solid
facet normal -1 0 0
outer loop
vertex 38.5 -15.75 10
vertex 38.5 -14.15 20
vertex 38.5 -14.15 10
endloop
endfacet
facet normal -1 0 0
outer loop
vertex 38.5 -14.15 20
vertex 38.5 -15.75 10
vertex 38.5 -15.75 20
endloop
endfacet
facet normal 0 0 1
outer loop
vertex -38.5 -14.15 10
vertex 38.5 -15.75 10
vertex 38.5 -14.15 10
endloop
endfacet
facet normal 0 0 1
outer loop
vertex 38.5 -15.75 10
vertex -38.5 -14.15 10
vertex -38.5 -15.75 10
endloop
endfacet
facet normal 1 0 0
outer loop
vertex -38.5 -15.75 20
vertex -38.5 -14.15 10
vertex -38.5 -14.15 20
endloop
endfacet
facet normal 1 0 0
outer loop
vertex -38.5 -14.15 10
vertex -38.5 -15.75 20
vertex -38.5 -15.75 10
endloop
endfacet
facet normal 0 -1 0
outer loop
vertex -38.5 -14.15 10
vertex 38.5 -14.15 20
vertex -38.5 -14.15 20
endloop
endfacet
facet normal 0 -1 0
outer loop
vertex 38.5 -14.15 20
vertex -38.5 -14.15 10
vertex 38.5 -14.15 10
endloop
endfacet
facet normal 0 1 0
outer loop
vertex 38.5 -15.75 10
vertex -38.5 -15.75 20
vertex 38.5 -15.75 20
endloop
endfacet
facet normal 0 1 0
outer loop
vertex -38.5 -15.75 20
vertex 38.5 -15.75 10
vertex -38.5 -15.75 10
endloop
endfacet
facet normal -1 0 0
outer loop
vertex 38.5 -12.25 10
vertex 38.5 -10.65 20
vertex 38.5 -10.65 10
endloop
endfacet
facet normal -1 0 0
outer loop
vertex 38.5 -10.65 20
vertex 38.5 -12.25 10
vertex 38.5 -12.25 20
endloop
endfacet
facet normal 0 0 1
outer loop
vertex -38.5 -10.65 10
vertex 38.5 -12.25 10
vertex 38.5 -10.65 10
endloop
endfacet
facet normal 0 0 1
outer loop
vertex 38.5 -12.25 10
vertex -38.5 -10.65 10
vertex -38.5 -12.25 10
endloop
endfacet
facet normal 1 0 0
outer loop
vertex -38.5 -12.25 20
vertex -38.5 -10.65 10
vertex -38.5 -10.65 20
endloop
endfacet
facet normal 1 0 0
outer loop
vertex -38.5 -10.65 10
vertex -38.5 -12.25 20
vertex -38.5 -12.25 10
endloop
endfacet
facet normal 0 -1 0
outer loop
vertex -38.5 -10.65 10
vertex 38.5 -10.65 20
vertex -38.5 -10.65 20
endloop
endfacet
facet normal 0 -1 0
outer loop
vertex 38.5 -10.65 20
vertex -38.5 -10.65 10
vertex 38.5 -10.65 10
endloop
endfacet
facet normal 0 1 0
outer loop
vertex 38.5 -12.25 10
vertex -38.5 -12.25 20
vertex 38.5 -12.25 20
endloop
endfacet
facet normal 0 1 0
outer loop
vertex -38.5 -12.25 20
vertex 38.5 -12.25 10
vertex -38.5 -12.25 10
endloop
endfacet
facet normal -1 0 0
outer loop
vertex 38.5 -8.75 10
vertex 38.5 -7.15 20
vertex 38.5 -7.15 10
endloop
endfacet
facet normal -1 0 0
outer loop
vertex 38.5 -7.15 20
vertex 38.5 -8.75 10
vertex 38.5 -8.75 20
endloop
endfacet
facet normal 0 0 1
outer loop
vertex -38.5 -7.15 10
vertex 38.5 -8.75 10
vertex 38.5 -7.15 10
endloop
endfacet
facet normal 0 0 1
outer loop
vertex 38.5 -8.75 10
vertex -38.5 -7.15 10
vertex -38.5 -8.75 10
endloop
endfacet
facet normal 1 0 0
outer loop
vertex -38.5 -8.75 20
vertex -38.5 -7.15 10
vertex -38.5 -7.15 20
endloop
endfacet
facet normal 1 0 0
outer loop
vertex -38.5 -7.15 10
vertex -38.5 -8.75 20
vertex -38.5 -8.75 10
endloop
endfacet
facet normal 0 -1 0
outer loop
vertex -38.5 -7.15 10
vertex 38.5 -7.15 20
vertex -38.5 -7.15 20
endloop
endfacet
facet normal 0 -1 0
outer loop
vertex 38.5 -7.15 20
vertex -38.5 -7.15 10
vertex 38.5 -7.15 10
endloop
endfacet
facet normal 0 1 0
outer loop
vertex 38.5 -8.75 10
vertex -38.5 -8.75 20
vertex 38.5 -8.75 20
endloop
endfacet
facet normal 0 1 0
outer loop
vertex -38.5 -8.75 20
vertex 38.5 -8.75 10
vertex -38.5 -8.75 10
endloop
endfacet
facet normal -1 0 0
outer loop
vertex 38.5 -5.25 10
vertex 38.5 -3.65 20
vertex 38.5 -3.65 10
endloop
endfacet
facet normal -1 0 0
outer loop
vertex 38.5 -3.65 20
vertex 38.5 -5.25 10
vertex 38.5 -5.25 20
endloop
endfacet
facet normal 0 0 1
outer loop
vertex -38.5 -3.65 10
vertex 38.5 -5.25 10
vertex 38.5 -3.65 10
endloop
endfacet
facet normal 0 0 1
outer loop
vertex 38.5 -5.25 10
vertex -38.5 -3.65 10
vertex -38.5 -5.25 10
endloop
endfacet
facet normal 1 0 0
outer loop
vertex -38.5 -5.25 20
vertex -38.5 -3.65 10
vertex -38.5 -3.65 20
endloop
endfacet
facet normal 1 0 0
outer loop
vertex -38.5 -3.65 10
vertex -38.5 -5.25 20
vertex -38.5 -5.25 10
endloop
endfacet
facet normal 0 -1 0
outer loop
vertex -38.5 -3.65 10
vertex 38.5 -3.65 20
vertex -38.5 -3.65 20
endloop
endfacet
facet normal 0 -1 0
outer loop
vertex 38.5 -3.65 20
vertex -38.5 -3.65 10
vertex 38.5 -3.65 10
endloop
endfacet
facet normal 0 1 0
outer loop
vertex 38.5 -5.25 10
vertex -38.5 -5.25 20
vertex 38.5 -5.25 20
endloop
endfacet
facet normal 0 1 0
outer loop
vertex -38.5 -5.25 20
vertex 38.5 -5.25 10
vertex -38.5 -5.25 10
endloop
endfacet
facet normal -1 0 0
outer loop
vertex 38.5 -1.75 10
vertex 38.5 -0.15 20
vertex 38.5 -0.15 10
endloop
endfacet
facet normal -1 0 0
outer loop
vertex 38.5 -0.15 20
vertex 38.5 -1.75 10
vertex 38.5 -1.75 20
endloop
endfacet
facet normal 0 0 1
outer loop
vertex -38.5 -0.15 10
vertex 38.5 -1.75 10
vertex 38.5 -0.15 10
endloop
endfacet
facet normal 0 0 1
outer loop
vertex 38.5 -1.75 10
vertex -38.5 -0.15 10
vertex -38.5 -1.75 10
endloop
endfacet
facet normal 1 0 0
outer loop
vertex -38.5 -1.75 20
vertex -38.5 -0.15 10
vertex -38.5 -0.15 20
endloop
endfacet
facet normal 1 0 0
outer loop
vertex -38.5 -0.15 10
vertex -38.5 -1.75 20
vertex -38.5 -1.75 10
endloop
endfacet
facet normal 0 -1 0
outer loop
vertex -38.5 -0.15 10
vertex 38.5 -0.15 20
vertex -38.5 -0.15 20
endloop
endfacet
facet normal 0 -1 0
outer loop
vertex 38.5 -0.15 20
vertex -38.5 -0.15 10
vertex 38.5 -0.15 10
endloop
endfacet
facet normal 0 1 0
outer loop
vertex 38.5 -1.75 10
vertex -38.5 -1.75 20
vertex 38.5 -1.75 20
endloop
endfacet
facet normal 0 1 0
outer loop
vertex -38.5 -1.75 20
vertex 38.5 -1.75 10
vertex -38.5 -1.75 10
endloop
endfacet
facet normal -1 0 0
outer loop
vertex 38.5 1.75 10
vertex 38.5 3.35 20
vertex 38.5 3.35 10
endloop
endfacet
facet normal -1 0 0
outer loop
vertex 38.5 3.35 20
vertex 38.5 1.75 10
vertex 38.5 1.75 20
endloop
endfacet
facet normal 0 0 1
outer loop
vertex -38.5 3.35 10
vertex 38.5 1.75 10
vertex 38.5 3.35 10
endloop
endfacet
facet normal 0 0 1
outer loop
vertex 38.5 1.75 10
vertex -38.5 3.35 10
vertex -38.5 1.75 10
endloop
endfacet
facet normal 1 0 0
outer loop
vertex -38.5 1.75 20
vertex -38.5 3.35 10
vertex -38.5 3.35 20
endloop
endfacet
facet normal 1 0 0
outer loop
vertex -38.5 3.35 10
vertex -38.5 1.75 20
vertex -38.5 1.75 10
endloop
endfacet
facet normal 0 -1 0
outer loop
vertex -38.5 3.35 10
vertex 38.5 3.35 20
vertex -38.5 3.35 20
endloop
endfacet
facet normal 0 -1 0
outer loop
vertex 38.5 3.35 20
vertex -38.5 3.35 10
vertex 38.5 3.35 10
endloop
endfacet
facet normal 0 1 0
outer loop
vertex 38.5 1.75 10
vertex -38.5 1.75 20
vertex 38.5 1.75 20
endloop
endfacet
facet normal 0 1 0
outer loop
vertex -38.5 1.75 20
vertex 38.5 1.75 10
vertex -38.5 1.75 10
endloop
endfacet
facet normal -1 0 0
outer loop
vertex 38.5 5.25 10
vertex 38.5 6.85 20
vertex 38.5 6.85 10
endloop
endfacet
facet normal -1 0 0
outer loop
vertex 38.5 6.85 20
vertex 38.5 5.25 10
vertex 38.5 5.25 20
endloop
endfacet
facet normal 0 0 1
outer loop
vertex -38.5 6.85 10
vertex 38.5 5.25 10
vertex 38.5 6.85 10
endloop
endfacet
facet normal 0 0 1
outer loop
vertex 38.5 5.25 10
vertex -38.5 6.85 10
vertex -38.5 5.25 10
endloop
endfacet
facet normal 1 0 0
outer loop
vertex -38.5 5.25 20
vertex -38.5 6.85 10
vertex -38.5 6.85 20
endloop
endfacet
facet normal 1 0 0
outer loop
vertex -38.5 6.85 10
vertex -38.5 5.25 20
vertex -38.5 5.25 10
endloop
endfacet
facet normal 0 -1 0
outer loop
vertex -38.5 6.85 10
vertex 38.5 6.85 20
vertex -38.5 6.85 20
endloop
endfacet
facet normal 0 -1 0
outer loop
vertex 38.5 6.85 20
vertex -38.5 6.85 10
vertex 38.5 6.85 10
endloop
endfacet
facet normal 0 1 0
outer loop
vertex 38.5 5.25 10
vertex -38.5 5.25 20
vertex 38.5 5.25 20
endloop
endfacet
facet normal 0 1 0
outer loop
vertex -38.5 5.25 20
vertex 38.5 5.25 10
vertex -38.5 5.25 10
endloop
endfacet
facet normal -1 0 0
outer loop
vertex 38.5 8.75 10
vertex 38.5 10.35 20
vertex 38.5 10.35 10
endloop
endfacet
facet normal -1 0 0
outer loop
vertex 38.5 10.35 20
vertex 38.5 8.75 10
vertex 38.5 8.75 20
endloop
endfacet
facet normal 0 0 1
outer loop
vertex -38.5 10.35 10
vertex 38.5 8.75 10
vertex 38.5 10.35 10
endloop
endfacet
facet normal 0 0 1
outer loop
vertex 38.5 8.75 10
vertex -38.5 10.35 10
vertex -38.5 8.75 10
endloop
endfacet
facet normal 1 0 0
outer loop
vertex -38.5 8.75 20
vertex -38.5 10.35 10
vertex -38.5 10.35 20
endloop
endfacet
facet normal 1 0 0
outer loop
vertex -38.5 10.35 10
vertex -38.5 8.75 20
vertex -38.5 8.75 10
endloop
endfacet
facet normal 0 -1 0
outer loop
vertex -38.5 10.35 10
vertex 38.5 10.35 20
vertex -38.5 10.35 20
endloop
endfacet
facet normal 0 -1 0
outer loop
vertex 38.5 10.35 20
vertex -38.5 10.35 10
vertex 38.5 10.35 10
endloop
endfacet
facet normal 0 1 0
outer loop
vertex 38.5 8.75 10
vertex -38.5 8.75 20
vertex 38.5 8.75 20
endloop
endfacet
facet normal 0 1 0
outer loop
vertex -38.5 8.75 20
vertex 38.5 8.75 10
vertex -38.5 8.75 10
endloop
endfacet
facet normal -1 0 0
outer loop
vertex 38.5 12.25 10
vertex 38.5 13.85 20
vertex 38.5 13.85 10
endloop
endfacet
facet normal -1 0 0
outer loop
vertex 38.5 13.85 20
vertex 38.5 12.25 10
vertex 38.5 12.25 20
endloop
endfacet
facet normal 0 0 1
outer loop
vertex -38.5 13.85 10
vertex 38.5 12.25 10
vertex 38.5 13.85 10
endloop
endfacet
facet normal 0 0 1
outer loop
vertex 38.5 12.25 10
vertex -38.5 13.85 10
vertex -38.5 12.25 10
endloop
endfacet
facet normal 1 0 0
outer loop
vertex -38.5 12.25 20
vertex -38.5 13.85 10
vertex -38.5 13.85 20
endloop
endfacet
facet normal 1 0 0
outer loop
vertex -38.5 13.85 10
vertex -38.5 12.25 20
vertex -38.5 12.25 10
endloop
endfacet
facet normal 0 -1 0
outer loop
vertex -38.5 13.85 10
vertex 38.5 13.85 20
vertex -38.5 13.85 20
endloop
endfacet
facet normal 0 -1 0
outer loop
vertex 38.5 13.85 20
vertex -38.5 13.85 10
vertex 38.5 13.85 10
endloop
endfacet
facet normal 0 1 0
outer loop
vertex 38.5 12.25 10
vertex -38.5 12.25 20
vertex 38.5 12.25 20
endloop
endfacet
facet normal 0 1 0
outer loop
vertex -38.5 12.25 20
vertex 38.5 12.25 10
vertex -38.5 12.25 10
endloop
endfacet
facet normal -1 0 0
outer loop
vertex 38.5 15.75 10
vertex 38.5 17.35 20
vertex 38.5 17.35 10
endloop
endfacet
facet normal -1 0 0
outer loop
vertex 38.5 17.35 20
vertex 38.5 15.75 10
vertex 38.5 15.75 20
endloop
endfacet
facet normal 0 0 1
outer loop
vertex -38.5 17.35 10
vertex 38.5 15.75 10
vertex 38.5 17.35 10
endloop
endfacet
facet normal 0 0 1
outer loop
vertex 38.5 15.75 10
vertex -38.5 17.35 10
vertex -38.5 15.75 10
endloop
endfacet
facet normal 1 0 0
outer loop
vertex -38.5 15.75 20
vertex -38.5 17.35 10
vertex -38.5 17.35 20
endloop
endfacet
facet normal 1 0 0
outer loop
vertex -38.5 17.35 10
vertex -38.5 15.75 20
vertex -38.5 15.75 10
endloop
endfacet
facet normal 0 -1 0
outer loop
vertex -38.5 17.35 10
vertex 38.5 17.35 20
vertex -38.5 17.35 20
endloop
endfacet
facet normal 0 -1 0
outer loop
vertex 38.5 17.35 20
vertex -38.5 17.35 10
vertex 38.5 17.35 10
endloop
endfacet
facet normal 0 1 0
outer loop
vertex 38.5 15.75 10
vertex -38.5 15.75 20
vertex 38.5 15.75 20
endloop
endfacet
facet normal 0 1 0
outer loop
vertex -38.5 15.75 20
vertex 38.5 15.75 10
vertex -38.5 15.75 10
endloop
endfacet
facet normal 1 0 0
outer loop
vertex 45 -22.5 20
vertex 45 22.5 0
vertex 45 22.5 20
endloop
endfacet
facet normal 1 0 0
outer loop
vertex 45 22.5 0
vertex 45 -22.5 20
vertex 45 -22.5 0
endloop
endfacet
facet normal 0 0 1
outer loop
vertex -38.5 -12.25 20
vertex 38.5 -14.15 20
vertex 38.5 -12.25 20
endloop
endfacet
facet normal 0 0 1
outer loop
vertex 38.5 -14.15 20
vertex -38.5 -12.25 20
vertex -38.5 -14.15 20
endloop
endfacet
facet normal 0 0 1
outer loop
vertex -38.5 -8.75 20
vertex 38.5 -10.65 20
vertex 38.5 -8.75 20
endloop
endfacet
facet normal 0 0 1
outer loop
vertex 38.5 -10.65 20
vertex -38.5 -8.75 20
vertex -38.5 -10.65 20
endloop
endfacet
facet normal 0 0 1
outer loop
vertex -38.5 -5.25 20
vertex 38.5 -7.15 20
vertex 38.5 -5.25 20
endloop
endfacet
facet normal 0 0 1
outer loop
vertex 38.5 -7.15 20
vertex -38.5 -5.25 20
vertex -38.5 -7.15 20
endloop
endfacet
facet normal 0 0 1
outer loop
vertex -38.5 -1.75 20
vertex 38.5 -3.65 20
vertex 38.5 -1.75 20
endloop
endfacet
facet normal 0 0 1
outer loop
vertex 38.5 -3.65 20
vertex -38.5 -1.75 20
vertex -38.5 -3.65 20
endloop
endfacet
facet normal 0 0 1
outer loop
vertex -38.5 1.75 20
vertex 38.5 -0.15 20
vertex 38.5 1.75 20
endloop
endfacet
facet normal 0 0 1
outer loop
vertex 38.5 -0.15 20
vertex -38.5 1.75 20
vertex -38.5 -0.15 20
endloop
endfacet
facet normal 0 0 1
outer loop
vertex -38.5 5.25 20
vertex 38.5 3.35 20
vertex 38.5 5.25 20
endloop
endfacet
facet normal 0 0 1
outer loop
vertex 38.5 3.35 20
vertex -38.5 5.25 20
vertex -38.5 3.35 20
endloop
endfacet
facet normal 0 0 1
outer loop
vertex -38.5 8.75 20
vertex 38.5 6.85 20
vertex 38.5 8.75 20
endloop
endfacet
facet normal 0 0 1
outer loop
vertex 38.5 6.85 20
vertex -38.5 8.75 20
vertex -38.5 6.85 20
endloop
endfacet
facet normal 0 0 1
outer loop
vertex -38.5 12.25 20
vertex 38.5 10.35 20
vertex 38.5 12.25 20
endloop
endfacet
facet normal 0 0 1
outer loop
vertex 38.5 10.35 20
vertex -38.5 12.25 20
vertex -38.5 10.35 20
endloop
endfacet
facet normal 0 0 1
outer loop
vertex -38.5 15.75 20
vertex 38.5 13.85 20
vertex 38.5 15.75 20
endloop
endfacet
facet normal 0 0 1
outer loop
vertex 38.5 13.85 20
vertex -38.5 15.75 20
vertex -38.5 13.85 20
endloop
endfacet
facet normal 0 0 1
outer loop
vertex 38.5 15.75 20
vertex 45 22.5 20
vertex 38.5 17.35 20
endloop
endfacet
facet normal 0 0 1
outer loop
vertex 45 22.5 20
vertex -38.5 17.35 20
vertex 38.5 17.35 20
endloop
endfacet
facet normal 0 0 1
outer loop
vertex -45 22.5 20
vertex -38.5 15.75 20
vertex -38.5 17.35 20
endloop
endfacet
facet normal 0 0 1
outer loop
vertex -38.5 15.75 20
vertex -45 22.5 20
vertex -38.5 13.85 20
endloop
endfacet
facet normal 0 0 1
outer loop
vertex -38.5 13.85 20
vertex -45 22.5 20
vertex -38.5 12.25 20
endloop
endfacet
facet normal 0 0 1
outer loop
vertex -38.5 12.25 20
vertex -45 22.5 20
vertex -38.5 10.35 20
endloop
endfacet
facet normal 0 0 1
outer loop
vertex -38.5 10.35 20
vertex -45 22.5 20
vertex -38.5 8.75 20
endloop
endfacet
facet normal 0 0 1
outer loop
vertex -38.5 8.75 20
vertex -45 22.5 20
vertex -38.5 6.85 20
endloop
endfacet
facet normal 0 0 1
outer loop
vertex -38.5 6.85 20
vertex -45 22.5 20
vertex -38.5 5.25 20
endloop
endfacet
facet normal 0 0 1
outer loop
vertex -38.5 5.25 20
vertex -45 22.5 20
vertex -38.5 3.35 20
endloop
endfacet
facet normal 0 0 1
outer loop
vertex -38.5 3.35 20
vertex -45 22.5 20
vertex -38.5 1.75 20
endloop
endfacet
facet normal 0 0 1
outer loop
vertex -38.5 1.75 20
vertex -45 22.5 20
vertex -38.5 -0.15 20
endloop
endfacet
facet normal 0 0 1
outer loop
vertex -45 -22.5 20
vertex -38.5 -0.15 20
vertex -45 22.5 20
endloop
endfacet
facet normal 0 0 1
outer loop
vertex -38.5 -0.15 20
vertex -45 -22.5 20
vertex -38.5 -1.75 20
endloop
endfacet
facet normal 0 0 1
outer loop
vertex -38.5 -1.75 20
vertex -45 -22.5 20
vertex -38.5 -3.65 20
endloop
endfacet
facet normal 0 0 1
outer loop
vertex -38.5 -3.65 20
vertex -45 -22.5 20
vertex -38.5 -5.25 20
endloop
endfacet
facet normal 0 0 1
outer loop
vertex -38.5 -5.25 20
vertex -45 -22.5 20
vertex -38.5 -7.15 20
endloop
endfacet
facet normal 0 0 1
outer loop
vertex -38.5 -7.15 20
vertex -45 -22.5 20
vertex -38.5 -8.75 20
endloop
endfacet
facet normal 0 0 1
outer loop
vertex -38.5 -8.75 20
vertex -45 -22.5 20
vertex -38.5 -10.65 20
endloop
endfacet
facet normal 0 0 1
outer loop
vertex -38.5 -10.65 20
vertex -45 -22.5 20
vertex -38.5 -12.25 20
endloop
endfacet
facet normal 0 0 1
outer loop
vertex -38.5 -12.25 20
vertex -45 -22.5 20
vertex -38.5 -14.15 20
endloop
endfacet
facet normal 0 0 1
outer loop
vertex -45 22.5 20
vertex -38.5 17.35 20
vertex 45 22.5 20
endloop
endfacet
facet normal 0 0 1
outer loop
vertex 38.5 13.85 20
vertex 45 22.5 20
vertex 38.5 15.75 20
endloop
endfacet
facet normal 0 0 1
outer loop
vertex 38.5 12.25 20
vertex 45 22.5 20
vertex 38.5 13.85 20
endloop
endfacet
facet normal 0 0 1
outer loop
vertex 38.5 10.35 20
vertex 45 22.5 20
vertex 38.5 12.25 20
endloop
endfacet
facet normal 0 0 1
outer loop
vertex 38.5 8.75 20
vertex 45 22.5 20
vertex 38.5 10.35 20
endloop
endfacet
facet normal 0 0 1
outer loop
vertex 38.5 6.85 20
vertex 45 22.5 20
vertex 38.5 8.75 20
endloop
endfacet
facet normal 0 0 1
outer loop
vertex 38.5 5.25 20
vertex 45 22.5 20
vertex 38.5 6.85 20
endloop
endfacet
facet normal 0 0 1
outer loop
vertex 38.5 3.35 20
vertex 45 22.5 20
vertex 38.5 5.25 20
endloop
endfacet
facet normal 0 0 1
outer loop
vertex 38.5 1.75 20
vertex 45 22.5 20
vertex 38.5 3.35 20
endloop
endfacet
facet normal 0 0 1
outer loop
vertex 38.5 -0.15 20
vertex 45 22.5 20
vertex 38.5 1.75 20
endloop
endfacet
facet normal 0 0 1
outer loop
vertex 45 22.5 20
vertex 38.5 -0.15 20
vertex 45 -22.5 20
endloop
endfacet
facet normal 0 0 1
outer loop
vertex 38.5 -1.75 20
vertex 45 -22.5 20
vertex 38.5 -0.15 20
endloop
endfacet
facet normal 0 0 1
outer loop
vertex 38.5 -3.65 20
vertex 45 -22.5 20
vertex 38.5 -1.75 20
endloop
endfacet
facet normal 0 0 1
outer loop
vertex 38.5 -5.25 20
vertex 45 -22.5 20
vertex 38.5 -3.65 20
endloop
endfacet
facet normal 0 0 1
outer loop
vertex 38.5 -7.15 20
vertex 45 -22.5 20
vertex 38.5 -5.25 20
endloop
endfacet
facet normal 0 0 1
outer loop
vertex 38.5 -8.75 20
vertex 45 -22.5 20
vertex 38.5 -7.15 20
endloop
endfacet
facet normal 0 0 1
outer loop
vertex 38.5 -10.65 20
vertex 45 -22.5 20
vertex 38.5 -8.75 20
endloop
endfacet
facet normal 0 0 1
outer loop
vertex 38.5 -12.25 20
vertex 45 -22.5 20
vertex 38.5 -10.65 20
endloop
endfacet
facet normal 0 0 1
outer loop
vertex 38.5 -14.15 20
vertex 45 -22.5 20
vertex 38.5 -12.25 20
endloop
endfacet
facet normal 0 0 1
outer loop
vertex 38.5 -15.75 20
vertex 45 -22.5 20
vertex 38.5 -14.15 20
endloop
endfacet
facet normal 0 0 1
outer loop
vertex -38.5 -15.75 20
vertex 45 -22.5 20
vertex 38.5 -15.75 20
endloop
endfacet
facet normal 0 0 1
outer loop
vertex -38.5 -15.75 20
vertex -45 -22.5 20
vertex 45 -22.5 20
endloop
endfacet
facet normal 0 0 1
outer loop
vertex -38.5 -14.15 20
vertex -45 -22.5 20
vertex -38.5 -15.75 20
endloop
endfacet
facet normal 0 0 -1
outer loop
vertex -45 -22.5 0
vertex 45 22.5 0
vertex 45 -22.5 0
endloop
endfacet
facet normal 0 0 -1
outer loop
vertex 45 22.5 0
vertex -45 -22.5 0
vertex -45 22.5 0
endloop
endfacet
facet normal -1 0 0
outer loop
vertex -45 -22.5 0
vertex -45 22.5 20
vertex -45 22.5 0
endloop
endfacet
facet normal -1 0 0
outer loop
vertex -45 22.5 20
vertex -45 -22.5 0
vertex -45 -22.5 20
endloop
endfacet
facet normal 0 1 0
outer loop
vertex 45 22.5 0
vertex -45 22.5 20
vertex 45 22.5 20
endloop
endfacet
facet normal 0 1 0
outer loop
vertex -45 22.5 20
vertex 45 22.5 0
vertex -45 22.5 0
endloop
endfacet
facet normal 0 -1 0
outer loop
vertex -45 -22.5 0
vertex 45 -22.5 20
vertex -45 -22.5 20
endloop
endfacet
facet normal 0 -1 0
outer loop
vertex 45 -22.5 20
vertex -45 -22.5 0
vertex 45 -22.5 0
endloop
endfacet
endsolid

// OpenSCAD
// Slide drying rack - holds 10 microscope slides upright on their long edge
// Print orientation: base block on the bed (z = 0), slots open upward.

// ---------------- Parameters ----------------
block_len    = 90;    // base block length along X (mm)
block_wid    = 45;    // base block width along Y (mm)
block_h      = 20;    // base block height along Z (mm)

slot_len     = 77;    // slot length along X (mm)
slot_w       = 1.6;   // slot width along Y (mm)
slot_depth   = 10;    // slot depth from top face (mm)
slot_pitch   = 3.5;   // centre-to-centre spacing of slots in Y (mm)
slot_count   = 10;    // number of slide slots

eps          = 0.5;   // overshoot so cutters pass cleanly through the top face (mm)

$fn = 64;

// ---------------- Model ----------------
difference() {
    // Base block, centred in X and Y, sitting on z = 0
    translate([-block_len/2, -block_wid/2, 0])
        cube([block_len, block_wid, block_h]);

    // Row of parallel slots, centred on the block in X and Y
    for (i = [0 : slot_count - 1]) {
        y = (i - (slot_count - 1)/2) * slot_pitch;
        translate([-slot_len/2, y, block_h - slot_depth])
            cube([slot_len, slot_w, slot_depth + eps]);
    }
}
